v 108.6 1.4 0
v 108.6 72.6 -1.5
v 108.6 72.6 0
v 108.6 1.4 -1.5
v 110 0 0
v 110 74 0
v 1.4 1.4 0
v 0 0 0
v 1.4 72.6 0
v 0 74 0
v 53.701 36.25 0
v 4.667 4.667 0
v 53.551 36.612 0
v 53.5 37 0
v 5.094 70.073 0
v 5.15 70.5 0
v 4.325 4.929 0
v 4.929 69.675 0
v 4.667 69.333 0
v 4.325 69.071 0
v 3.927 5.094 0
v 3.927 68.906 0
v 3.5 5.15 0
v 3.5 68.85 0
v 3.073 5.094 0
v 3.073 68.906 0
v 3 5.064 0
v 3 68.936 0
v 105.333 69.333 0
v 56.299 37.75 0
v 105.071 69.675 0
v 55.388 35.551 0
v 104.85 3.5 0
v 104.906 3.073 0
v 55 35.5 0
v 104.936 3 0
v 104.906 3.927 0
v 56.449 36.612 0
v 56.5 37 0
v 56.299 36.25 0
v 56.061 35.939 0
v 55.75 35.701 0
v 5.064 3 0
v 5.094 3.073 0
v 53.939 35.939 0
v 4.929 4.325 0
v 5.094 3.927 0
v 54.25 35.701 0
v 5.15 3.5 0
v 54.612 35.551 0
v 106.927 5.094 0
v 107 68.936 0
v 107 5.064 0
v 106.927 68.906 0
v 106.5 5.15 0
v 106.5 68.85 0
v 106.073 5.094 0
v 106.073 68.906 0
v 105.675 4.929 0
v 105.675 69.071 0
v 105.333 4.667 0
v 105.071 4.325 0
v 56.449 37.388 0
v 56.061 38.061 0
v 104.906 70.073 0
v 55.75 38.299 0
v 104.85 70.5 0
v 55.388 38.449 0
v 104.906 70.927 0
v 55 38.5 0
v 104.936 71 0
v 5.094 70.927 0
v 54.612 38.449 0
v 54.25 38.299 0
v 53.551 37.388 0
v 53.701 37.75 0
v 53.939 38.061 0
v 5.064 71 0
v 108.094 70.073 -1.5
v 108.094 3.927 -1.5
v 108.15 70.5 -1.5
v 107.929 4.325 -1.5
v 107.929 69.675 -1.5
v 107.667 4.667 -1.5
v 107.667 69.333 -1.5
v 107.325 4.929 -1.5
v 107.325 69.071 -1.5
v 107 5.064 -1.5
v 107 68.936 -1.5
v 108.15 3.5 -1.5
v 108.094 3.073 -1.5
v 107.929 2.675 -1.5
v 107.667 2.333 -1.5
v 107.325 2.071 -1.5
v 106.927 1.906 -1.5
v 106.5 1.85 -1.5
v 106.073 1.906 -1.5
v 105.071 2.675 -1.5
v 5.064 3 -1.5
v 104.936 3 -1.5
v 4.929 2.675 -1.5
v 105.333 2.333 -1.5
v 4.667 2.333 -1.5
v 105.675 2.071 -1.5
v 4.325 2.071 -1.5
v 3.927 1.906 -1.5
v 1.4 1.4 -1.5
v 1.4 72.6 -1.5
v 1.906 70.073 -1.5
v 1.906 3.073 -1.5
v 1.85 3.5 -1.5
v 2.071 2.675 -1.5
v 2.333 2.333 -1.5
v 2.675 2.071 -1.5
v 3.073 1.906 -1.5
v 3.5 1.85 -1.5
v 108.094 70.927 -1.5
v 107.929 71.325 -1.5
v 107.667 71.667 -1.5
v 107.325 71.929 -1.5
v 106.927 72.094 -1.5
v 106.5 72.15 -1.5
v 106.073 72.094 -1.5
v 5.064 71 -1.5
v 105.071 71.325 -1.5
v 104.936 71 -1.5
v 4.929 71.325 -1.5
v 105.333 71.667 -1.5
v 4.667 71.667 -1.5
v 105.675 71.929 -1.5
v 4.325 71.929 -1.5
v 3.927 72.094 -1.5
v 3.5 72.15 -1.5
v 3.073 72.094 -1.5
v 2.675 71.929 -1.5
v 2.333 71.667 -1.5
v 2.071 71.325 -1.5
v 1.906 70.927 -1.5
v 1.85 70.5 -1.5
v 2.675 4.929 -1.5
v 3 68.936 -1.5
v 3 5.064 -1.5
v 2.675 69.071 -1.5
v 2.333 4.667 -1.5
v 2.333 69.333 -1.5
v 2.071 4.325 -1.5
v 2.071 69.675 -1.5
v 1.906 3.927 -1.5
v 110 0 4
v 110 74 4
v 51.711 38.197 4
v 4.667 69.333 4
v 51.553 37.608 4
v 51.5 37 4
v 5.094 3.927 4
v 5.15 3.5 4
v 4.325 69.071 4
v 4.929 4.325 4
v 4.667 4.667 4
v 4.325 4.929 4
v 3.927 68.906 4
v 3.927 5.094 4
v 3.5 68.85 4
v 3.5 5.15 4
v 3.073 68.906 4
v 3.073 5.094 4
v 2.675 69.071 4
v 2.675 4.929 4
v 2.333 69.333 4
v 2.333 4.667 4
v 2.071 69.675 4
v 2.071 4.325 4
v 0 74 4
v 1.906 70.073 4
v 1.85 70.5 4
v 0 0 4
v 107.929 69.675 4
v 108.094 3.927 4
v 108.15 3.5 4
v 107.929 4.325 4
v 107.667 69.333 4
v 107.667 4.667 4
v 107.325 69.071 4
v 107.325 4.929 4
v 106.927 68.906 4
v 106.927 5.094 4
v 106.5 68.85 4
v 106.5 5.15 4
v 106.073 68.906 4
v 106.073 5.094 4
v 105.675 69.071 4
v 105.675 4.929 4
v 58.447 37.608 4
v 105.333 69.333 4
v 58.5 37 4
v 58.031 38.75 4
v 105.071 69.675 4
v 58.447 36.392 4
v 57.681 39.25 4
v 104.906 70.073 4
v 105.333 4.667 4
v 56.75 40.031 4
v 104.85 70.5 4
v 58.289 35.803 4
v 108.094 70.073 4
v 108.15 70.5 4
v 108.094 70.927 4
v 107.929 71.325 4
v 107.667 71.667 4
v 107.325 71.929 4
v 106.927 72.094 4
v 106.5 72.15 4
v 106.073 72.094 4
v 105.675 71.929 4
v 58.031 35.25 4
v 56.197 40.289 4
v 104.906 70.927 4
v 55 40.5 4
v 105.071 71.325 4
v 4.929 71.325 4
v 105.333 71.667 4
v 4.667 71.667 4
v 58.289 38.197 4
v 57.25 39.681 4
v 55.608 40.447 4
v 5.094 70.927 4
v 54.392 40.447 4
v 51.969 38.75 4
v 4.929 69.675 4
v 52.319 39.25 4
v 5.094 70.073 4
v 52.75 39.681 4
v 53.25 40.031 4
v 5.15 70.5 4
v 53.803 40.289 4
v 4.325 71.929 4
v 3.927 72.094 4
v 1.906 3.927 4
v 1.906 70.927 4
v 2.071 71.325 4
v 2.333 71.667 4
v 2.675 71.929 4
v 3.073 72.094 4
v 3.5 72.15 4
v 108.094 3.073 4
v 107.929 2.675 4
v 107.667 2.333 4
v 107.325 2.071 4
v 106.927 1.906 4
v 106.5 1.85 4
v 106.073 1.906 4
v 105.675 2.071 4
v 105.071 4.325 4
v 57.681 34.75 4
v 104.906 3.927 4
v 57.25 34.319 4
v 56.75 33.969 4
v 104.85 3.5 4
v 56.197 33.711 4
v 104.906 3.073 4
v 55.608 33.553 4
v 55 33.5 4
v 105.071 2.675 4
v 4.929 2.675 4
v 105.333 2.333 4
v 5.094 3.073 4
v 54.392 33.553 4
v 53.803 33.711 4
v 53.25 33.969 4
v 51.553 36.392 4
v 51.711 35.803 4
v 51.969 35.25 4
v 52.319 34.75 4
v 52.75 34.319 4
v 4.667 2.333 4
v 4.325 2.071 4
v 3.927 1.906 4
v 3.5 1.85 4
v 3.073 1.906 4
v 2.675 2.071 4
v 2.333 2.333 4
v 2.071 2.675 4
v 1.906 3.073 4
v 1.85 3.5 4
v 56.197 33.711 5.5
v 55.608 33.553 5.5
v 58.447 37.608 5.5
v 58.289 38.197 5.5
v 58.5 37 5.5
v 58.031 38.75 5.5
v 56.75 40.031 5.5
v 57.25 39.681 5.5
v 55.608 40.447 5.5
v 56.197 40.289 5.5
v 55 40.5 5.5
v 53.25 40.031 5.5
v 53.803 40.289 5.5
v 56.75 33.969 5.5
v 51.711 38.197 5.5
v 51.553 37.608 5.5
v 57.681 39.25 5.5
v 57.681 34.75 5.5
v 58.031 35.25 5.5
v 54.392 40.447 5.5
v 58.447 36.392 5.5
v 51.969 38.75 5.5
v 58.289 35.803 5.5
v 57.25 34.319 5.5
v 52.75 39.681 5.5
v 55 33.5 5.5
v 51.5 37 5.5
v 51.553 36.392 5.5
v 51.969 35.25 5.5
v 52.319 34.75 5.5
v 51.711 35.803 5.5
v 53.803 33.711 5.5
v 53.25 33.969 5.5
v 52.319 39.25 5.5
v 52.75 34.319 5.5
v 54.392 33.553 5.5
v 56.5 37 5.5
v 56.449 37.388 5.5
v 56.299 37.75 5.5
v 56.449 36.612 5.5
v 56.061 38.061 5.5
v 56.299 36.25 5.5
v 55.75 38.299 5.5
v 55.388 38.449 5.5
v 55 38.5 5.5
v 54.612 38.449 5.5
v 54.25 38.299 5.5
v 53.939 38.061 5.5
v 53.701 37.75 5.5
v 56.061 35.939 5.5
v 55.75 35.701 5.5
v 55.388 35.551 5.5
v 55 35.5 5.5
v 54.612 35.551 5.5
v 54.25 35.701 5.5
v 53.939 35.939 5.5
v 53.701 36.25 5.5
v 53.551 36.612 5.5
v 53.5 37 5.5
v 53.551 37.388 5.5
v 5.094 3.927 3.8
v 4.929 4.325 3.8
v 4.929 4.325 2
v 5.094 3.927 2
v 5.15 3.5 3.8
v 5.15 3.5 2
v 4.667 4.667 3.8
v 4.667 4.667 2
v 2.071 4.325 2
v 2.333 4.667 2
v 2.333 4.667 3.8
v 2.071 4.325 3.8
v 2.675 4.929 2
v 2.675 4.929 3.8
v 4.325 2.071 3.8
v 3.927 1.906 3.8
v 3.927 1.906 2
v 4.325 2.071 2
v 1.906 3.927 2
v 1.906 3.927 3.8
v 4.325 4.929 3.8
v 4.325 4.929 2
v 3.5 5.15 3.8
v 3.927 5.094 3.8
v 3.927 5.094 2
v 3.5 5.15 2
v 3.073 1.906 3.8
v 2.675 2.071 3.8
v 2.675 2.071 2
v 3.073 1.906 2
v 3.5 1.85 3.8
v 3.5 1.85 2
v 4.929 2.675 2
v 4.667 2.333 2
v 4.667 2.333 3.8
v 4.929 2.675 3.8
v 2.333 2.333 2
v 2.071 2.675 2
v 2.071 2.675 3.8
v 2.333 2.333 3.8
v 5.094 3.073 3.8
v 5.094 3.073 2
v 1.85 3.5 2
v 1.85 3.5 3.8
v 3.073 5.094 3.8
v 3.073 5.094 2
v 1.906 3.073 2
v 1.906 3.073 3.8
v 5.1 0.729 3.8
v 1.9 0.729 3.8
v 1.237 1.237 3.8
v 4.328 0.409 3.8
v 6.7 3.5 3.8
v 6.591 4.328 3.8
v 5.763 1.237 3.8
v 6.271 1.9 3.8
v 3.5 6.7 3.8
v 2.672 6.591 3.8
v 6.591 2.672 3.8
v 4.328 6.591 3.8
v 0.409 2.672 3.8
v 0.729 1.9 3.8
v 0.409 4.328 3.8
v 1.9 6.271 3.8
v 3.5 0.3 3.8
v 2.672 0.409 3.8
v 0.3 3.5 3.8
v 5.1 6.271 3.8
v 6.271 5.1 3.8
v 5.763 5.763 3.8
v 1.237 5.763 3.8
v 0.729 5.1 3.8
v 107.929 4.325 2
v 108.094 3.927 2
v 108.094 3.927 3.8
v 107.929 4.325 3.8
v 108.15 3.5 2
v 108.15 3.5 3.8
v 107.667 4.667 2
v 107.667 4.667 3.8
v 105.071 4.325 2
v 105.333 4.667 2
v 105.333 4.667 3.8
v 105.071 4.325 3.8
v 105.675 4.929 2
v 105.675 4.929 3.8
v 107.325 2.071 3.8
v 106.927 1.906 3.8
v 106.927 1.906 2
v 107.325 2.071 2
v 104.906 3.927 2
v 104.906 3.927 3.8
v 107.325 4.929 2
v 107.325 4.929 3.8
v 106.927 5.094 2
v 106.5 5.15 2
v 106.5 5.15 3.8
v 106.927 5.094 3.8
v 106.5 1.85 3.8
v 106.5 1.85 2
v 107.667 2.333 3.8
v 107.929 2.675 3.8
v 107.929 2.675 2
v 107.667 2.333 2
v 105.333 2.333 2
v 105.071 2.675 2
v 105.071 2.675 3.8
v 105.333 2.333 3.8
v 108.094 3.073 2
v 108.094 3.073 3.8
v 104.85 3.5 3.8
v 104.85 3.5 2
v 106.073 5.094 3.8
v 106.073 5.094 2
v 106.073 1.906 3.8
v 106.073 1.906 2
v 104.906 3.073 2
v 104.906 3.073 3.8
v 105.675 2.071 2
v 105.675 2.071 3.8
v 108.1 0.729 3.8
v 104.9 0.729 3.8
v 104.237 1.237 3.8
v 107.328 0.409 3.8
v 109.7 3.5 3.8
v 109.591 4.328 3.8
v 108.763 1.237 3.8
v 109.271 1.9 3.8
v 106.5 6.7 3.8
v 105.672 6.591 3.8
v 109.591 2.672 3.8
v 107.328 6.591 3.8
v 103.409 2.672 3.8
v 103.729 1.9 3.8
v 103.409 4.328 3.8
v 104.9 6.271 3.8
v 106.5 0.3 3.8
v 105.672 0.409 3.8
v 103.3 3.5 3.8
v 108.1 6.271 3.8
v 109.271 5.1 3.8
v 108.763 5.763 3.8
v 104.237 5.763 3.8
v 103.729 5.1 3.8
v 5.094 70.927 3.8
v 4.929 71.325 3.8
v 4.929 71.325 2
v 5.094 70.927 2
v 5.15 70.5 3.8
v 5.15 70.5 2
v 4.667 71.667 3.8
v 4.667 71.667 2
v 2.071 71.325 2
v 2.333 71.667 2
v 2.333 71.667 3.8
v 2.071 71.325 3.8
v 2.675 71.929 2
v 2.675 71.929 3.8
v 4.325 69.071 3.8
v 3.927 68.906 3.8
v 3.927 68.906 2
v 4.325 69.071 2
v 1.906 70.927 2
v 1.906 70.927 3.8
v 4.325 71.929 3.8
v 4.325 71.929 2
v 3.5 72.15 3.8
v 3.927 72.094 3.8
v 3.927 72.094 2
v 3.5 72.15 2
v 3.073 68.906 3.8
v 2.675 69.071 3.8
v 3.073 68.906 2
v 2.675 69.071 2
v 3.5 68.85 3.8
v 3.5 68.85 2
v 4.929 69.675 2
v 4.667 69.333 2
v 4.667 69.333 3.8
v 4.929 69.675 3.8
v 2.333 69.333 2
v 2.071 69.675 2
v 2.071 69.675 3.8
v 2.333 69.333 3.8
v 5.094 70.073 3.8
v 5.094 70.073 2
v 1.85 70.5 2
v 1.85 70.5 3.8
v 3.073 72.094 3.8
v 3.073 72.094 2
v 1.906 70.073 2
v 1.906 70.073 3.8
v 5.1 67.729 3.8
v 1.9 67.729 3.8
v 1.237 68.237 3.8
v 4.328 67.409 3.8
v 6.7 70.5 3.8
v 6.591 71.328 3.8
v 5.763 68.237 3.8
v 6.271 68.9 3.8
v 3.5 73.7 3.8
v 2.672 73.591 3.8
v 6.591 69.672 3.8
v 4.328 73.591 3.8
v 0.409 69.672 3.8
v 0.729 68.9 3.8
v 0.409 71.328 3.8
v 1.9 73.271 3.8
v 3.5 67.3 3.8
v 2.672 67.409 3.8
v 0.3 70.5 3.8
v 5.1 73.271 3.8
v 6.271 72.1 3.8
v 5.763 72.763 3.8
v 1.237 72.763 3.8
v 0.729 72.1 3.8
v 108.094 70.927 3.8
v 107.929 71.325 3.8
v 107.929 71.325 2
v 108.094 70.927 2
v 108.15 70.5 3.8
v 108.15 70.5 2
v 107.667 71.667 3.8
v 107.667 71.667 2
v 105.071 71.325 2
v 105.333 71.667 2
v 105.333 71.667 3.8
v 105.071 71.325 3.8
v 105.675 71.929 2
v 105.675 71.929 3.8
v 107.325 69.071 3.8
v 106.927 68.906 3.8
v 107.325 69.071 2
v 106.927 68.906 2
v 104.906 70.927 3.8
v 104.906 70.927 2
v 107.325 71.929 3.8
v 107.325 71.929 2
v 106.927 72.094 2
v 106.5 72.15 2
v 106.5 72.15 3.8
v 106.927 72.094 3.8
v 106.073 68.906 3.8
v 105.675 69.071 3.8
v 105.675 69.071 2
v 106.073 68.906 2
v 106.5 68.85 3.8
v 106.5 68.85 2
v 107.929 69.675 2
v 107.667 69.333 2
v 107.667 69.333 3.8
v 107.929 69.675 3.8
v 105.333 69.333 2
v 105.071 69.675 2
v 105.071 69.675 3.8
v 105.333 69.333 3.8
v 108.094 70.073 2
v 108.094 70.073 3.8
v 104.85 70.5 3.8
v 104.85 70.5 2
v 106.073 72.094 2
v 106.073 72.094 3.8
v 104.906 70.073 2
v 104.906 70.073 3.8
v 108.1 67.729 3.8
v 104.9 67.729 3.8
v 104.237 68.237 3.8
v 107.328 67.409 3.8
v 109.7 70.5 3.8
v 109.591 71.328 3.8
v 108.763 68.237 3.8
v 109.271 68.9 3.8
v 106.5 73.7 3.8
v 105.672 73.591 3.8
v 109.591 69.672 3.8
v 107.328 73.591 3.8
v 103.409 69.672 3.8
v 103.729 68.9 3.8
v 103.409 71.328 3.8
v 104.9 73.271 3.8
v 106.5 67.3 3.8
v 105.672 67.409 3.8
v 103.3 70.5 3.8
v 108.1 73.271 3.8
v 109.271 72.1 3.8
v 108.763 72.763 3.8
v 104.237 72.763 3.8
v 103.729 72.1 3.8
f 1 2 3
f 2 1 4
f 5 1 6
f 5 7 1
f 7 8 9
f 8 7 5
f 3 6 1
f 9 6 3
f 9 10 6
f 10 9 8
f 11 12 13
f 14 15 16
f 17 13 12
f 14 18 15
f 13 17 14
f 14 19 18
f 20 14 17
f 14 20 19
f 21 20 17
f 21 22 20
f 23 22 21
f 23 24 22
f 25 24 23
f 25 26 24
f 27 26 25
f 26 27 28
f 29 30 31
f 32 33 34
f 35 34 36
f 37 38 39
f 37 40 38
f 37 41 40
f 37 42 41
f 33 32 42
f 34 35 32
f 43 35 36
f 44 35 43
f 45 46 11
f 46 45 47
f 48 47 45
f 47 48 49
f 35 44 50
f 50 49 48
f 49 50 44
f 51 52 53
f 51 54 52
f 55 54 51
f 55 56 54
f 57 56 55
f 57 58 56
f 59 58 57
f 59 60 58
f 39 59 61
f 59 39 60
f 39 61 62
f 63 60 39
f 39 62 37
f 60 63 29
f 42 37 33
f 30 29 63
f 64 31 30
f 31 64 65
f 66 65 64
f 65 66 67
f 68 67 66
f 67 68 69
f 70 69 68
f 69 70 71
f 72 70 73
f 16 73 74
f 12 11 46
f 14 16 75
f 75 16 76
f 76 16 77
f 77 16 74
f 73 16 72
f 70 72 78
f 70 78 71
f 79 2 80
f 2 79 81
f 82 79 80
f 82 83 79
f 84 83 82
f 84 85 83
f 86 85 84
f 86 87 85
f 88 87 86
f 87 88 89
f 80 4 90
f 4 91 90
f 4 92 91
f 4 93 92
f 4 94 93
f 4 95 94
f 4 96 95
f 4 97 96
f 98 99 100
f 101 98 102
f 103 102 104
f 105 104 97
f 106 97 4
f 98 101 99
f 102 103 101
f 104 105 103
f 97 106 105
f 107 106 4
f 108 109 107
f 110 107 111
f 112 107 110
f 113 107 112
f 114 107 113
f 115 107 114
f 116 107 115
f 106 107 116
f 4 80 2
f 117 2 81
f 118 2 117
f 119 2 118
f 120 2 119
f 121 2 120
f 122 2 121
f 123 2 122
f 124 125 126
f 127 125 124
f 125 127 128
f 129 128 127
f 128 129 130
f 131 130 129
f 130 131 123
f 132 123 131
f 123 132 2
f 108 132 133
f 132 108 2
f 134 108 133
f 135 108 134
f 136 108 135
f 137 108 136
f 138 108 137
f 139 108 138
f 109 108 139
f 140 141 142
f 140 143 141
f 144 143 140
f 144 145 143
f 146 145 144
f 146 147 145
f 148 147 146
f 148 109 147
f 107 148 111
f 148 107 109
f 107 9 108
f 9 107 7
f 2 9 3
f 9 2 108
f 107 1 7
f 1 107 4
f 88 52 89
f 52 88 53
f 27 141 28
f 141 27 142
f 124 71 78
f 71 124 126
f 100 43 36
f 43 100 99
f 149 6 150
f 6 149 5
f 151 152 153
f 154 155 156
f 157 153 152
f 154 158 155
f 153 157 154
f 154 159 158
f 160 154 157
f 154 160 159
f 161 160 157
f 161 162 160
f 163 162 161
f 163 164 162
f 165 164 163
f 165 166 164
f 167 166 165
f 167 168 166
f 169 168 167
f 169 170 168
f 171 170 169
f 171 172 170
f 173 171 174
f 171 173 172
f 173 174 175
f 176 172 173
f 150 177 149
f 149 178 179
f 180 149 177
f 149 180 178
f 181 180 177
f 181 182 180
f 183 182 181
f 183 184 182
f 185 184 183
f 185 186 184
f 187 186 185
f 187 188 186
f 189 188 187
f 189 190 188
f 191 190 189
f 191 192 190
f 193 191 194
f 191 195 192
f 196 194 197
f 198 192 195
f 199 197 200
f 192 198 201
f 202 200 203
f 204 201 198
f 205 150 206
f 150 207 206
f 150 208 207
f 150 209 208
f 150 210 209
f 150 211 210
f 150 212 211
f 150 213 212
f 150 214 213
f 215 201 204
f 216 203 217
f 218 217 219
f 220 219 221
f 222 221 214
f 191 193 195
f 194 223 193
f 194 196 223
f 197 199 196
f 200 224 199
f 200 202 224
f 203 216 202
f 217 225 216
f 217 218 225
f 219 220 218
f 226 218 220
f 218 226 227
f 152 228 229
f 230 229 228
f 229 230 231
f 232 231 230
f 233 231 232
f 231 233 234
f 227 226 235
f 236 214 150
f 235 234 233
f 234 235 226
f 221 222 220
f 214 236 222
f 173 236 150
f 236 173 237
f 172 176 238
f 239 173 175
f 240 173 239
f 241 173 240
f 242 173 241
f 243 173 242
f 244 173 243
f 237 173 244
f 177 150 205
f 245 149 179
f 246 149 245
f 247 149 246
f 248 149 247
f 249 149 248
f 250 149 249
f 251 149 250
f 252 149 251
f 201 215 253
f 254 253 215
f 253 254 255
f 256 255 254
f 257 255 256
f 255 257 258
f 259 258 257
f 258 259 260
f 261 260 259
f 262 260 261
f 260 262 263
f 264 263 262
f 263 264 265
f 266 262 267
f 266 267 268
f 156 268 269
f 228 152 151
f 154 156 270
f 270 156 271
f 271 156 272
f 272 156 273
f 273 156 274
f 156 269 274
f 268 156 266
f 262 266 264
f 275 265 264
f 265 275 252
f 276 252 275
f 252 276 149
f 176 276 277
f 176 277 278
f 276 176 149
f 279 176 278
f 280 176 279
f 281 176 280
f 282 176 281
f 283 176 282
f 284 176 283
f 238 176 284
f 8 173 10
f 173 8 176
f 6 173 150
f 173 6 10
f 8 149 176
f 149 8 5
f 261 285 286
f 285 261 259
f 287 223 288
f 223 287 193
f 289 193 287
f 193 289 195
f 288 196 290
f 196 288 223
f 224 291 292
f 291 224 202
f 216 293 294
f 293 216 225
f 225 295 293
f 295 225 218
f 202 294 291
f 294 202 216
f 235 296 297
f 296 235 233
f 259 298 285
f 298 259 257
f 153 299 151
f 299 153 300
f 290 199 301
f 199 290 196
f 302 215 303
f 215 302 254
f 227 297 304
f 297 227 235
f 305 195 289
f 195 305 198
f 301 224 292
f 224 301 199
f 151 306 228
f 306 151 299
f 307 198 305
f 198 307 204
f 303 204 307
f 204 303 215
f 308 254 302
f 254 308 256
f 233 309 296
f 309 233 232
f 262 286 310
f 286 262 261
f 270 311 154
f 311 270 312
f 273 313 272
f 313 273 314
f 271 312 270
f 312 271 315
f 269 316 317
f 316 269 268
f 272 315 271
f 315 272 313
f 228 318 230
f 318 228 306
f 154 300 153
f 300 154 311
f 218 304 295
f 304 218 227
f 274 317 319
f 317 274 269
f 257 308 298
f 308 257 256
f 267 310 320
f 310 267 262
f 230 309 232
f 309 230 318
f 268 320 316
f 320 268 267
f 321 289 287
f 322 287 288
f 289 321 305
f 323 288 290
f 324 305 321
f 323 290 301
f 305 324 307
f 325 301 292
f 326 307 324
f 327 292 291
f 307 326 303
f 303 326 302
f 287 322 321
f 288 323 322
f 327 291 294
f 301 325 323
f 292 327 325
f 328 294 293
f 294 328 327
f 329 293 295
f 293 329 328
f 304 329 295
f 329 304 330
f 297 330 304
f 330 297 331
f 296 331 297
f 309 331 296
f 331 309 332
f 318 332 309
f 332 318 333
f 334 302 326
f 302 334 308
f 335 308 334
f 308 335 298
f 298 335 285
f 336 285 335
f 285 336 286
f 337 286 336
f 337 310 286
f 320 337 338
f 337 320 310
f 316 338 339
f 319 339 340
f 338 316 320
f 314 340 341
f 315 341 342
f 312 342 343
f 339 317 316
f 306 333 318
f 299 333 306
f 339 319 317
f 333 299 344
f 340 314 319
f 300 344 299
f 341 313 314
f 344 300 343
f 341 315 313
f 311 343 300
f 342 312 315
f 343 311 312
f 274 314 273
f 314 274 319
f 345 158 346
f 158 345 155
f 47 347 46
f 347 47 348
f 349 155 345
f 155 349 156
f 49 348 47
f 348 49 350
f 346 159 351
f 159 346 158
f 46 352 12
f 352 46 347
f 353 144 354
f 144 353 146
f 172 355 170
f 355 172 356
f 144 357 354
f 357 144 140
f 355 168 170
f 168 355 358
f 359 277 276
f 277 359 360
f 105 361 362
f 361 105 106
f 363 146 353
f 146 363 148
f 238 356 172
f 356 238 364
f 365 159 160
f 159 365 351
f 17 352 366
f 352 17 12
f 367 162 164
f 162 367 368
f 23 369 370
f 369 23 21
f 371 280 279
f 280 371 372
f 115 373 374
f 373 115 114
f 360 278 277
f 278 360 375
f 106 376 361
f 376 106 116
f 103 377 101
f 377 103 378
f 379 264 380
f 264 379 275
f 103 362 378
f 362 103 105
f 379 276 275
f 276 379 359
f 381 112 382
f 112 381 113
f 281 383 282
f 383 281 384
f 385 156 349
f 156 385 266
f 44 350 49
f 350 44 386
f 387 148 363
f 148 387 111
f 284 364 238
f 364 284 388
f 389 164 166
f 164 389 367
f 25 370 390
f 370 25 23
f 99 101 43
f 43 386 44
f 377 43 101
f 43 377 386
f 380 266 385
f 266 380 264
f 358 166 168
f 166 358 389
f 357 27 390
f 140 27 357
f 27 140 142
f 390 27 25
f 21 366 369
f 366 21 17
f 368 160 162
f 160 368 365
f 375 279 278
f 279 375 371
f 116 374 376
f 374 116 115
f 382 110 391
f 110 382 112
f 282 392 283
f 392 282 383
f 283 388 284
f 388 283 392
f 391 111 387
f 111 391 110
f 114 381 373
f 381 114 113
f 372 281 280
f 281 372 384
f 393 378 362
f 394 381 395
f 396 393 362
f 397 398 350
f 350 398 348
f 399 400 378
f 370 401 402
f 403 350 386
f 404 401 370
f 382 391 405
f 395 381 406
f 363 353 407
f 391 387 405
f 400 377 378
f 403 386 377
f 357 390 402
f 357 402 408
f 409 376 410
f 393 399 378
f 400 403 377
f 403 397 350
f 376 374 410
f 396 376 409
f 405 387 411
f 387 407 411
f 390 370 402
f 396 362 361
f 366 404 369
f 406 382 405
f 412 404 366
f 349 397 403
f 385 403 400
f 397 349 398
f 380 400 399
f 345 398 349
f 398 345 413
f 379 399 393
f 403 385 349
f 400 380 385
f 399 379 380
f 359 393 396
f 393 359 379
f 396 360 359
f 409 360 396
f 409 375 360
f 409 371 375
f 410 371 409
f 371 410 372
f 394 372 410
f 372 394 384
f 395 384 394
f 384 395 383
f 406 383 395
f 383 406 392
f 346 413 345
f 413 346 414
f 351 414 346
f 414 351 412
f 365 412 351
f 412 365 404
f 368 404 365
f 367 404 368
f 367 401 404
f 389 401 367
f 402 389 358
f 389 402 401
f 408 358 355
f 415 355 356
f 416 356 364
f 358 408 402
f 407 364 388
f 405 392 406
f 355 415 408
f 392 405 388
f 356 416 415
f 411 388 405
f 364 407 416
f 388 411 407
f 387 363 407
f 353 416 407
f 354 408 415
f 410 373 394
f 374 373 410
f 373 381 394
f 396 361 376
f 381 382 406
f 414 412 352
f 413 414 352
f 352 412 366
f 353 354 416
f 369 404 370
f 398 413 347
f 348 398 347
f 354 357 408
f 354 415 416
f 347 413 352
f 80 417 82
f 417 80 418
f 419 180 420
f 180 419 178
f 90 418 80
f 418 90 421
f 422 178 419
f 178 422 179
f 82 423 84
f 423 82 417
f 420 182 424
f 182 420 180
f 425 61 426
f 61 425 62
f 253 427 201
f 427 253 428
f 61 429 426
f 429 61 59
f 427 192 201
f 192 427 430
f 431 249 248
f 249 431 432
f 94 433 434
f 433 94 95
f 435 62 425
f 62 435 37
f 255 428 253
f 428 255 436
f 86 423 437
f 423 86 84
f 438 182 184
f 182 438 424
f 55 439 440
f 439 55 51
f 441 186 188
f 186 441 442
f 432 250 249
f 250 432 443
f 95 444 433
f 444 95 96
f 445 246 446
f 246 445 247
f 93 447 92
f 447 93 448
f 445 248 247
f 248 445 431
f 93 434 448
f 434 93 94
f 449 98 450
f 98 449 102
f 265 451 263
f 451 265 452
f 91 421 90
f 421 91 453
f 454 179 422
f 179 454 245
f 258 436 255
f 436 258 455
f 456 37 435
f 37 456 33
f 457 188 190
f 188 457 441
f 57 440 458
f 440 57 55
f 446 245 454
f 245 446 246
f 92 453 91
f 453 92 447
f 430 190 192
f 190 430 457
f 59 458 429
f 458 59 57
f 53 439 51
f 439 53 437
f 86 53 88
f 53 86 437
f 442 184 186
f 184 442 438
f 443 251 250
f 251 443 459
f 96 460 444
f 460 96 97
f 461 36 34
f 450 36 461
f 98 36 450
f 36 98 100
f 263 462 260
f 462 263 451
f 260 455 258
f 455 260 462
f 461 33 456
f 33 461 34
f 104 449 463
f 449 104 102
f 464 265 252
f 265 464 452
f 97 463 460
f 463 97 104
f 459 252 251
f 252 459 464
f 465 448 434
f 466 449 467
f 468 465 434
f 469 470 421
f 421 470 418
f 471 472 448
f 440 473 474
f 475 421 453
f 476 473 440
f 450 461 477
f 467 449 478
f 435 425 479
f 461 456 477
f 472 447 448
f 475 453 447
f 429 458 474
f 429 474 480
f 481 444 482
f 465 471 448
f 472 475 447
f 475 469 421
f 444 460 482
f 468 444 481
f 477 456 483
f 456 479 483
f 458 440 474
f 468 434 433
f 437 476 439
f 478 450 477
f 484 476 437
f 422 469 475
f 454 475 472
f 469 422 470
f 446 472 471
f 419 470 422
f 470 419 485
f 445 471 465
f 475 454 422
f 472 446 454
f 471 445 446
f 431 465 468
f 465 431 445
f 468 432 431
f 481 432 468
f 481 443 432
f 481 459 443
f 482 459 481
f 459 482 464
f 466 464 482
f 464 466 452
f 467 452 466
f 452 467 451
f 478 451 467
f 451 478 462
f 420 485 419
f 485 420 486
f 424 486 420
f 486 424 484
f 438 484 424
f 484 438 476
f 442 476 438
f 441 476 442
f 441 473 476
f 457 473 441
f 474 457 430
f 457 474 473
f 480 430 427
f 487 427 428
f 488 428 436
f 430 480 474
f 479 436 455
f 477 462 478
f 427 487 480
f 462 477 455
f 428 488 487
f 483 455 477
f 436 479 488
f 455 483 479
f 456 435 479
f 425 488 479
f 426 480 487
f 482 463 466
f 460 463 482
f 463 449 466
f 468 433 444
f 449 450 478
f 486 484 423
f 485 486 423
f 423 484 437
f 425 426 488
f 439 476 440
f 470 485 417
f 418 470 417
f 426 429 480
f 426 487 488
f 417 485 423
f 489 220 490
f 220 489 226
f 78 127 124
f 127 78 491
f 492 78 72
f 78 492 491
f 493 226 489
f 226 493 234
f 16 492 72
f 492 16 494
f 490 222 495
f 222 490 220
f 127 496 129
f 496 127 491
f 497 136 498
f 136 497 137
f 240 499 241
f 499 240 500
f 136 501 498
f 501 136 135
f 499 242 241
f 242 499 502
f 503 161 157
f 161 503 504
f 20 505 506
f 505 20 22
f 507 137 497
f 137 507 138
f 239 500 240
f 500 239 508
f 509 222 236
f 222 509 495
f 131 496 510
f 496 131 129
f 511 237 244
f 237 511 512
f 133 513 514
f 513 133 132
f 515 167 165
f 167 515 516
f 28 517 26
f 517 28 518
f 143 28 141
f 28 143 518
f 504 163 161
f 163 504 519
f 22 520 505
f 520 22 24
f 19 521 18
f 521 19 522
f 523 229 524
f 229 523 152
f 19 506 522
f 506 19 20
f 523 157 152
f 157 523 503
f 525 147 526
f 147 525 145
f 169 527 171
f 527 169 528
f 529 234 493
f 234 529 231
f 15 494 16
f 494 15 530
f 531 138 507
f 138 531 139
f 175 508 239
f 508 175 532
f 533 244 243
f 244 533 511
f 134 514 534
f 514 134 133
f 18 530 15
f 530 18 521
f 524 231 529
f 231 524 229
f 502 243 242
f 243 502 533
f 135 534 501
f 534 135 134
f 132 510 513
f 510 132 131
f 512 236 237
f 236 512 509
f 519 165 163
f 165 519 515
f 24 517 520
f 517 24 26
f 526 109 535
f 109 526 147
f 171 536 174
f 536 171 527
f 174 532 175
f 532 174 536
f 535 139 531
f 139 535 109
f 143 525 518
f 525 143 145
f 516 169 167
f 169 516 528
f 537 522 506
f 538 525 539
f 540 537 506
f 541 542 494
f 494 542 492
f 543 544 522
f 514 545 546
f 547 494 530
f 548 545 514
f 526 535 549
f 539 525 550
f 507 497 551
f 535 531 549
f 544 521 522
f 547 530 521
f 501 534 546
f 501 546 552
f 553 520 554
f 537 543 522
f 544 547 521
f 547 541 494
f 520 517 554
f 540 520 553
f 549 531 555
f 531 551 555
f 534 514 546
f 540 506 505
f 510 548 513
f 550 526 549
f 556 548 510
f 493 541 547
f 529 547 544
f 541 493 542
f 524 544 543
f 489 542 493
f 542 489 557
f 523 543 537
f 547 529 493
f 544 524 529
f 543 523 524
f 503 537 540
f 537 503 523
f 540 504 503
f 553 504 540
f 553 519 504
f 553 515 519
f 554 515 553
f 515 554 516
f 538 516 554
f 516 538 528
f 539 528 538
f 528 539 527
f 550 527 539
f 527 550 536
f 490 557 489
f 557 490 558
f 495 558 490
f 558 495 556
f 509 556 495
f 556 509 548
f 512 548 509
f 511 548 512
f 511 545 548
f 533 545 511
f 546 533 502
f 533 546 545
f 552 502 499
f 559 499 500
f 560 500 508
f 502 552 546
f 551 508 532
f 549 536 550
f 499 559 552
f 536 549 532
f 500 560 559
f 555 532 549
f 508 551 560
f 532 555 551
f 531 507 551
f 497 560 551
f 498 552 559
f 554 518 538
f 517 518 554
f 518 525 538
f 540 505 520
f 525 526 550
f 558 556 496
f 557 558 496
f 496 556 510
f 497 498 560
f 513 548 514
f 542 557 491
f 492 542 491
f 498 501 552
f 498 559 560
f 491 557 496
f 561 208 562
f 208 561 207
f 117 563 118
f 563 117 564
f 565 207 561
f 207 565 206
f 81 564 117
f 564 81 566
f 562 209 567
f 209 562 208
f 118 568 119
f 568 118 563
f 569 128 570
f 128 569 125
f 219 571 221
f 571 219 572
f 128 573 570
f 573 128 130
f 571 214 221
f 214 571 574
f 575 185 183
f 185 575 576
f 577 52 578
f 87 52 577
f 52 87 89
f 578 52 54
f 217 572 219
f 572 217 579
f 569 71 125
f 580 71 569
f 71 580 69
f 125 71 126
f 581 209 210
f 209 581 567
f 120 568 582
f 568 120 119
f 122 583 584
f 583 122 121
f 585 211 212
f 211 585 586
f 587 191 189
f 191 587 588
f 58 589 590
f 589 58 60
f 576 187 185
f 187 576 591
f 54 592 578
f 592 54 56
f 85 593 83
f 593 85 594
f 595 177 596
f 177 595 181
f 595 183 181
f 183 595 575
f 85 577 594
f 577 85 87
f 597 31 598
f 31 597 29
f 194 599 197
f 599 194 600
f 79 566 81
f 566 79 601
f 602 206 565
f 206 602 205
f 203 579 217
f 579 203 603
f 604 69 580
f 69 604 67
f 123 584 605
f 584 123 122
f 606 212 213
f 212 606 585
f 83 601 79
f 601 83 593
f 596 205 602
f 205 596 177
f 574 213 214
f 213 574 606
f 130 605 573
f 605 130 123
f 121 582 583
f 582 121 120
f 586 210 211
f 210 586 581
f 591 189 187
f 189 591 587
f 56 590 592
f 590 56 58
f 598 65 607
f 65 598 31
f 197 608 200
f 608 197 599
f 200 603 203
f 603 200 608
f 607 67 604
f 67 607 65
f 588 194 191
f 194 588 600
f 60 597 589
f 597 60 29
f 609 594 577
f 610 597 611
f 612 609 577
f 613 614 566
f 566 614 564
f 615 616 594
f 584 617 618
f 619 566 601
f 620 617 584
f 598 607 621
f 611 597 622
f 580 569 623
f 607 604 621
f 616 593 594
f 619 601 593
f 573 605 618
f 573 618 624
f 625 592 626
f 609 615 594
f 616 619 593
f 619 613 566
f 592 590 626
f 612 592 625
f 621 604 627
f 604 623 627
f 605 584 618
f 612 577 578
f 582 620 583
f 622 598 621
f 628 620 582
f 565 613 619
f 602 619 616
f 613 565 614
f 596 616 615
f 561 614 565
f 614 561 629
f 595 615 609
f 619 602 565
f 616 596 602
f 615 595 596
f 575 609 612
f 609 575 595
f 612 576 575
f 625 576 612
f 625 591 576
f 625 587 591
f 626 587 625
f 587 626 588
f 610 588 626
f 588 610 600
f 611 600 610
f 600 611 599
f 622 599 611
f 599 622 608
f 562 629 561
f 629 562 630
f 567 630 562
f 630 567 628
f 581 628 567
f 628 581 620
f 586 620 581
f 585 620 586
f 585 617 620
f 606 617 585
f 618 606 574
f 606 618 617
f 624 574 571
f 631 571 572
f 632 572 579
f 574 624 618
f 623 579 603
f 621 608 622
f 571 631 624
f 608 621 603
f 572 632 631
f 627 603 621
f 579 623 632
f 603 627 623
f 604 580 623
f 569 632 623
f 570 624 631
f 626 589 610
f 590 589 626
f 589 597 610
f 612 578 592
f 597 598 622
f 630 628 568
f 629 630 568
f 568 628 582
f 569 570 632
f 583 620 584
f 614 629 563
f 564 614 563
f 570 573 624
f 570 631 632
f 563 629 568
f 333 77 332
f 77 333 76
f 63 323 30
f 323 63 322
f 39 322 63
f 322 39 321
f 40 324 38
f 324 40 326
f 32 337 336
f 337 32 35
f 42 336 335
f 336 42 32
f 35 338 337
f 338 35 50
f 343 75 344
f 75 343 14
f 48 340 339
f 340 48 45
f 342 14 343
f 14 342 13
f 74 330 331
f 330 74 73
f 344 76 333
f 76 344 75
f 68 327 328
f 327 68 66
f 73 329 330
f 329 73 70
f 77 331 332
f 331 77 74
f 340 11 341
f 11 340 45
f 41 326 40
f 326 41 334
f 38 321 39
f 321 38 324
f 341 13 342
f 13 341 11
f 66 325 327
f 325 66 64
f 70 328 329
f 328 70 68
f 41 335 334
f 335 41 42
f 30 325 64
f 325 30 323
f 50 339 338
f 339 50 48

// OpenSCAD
// file: ../../00_common/parameters.scad
// =============================================================================
// OpenMotorBridge - Global CAD Parameters & Settings
// =============================================================================
// File: hardware/cad/scad/00_common/parameters.scad
// Description: Global dimensional constants, manufacturing clearances and
//              circle resolution ($fn) for all OpenSCAD modules.
// =============================================================================

// --- 1. Circle & Curve Resolution ---
$fn = 60; // Smooth cylinders and holes for high-quality MJF 3D printing

// --- 2. Central Main Box Dimensions (3-Tier Sandwich) ---
MAIN_BOX_OUTER_L      = 110.0; // Outer length in X (mm)
MAIN_BOX_OUTER_W      = 74.0;  // Outer width in Y (mm)
MAIN_BOX_LOWER_H      = 17.0;  // Lower case height in Z (mm)
MAIN_BOX_MID_H        = 15.0;  // Mid tray height in Z (mm)
MAIN_BOX_LID_H        = 4.0;   // Lid plate thickness in Z (mm)
MAIN_BOX_WALL         = 2.5;   // Nominal wall thickness (mm)
MAIN_BOX_CORNER_POST  = 7.0;   // Corner clamping screw post size (mm, for M3 hex nut pockets)

// --- 3. Satellite Pod Dimensions (Universal Enlarged Envelope) ---
POD_OUTER_L           = 150.0; // Outer length in X (mm, standardized for serial PCBA 03 + Cardo/Sena/OMM)
POD_OUTER_W           = 70.0;  // Outer width in Y (mm)
POD_OUTER_H           = 38.0;  // Outer height in Z (mm)
POD_WALL              = 3.5;   // Nominal wall thickness (mm)
POD_BULKHEAD_X        = 18.0;  // Partition bulkhead position in X (mm)
POD_CHAMBER_L         = 132.0; // Sliding chamber length in X (mm, clears 130mm sled + 2mm margin)
POD_CHAMBER_W         = 63.0;  // Sliding chamber width in Y (mm)
POD_CHAMBER_H         = 31.0;  // Sliding chamber height in Z (mm)

// --- 4. Pod Linear Guide Rails (Poka-Yoke Tongue & Groove) ---
POD_GROOVE_W          = 3.0;   // Internal guide groove width in Z (mm)
POD_GROOVE_DEPTH      = 1.5;   // Internal guide groove depth in Y (mm)
POD_GROOVE_LEFT_Z     = 10.0;  // Center height of left groove (mm)
POD_GROOVE_RIGHT_Z    = 18.0;  // Center height of right groove (mm, asym offset)

CARTRIDGE_TONGUE_W    = 2.6;   // Cartridge tongue rail height in Z (mm, 0.2mm clearance)
CARTRIDGE_TONGUE_PROT = 1.4;   // Cartridge tongue protrusion in Y (mm, 0.1mm clearance)
CARTRIDGE_CHAMFER_L   = 4.0;   // 30° lead-in chamfer nose length (mm)

// --- 5. Cartridge Dimensions (Enlarged Universal Sled) ---
CARTRIDGE_BASE_L      = 130.0; // Sled length in X (mm, accommodates PCBA 03 + OEM Cardo Air-Mount/Sena/OMM serial layout)
CARTRIDGE_BASE_W      = 58.0;  // Sled width in Y (mm)
CARTRIDGE_BASE_H      = 28.0;  // Sled height in Z (mm)
CARTRIDGE_FACE_L      = 4.0;   // Front faceplate thickness in X (mm)
CARTRIDGE_FACE_W      = 64.0;  // Front faceplate width in Y (mm)
CARTRIDGE_FACE_H      = 34.0;  // Front faceplate height in Z (mm)

// --- 5a. RF Interface & Sealing Dimensions ---
SMA_BORE_R            = 3.25;  // Ø 6.5 mm through-hole for standard SMA bulkhead
SMA_ORECESS_R         = 4.75;  // Ø 9.5 mm recess for waterproof silicone O-ring
SMA_ORECESS_DEPTH     = 1.2;   // 1.2 mm deep O-ring compression pocket

// --- 5b. Magnetic Anti-Theft Lock System ---
LATCH_PIVOT_X         = 65.0;  // Center pivot position along sled X (mm, centered on 130mm sled)
LATCH_MAGNET_X        = 53.0;  // Ferromagnetic anchor position along sled X (mm)
LATCH_TOOTH_X         = 77.0;  // Locking sawtooth pawl position along sled X (mm)
LATCH_ARM_H           = 6.0;   // Rocker lever height in Z (mm)
LATCH_ARM_THICK       = 2.6;   // Rocker beam thickness in Y (mm)
LATCH_MAGNET_PIN_DIA  = 6.2;   // Bore for Ø 6.0 mm steel dowel pin (mm)
LATCH_SPRING_DIA      = 3.8;   // Bore for Ø 3.5 mm return compression spring (mm)

// --- 6. Standard Captive Hex Nut Pockets (DIN 934 / DIN 985 with +0.2 mm MJF/FDM clearance) ---
NUT_M2_SW             = 4.2;   // M2 across flats (nominal 4.0 mm)
NUT_M2_H              = 1.8;   // M2 thickness (nominal 1.6 mm)
NUT_M2_5_SW           = 5.2;   // M2.5 across flats (nominal 5.0 mm)
NUT_M2_5_H            = 2.2;   // M2.5 thickness (nominal 2.0 mm)
NUT_M3_SW             = 5.7;   // M3 across flats (nominal 5.5 mm)
NUT_M3_H              = 2.6;   // M3 thickness (nominal 2.4 mm)
NUT_M4_SW             = 7.2;   // M4 across flats (nominal 7.0 mm)
NUT_M4_H              = 3.4;   // M4 thickness (nominal 3.2 mm)
NUT_M5_SW             = 8.2;   // M5 across flats (nominal 8.0 mm)
NUT_M5_H              = 4.2;   // M5 thickness (nominal 4.0 mm)

// Direct Plastic Thread-Forming / Self-Tapping Pilot Holes in PA12 (100% Soldering-Iron Free)
M2_PILOT_HOLE_R       = 0.85;  // Core hole for M2 screws in PA12 (Ø 1.7 mm)
M2_5_PILOT_HOLE_R     = 1.05;  // Core hole for M2.5 screws in PA12 (Ø 2.1 mm)
M3_PILOT_HOLE_R       = 1.25;  // Core hole for M3 screws in PA12 (Ø 2.5 mm)

// --- 7. Screw & Clearance Dimensions ---
M2_SCREW_HOLE_R       = 1.1;   // M2 clearance hole (r = 1.1 mm -> Ø 2.2 mm)
M2_5_SCREW_HOLE_R     = 1.4;   // M2.5 clearance hole (r = 1.4 mm -> Ø 2.8 mm)
M3_SCREW_HOLE_R       = 1.65;  // M3 clearance hole (r = 1.65 mm -> Ø 3.3 mm)
M4_SCREW_HOLE_R       = 2.2;   // M4 clearance hole (r = 2.2 mm -> Ø 4.4 mm)
M8_BORE_R             = 4.0;   // M8 cable through-bore (r = 4.0 mm -> Ø 8.0 mm)
M8_STUDS_OUTER_R      = 6.0;   // M8 neck outer radius (Ø 12.0 mm)

// --- 8. Universal Front Node Enclosure Dimensions (Type E: 98 x 68 x 25 mm) ---
FRONT_NODE_PCB_L      = 82.0;  // PCB length in X (mm, PCBA 05)
FRONT_NODE_PCB_W      = 50.0;  // PCB width in Y (mm, PCBA 05)
FRONT_NODE_PCB_H      = 1.6;   // PCB thickness in Z (mm)
FRONT_NODE_PCB_R      = 2.5;   // PCB corner radius (mm)

FRONT_NODE_CHAMBER_L  = 86.0;  // Internal chamber length in X (mm, 2mm margin per side)
FRONT_NODE_CHAMBER_W  = 56.0;  // Internal chamber width in Y (mm, 3mm margin per side)
FRONT_NODE_TUB_H      = 17.5;  // Lower tub depth in Z (mm)
FRONT_NODE_LID_H      = 7.5;   // Upper lid height in Z (mm)
FRONT_NODE_WALL       = 2.5;   // Wall thickness in HP MJF PA12 (mm)
FRONT_NODE_CORNER_R   = 4.0;   // Outer enclosure corner radius (mm)

FRONT_NODE_OUTER_L    = FRONT_NODE_CHAMBER_L + 2 * FRONT_NODE_WALL + 7.0; // 98.0 mm
FRONT_NODE_OUTER_W    = FRONT_NODE_CHAMBER_W + 2 * FRONT_NODE_WALL + 7.0; // 68.0 mm
FRONT_NODE_OUTER_H    = FRONT_NODE_TUB_H + FRONT_NODE_LID_H;              // 25.0 mm

// PCB Standoff Heights & Radii (100% Soldering-Iron Free)
FRONT_NODE_STANDOFF_H = 3.0;   // Height of PCB standoffs from floor (mm)
FRONT_NODE_STANDOFF_R = 3.0;   // Outer radius of M2.5 screw bosses (mm)
FRONT_NODE_CORE_HOLE_R= M2_5_PILOT_HOLE_R; // Core hole for direct M2.5 screw engagement (Ø 2.1 mm)

// AMPS 4-Hole Mounting Pattern (38 x 30 mm with DIN 934 M4 Captive Nut Pockets)
AMPS_SPACING_X        = 38.0;  // AMPS hole distance in X (mm)
AMPS_SPACING_Y        = 30.0;  // AMPS hole distance in Y (mm)
AMPS_NUT_SW           = NUT_M4_SW; // Captive M4 hex nut pocket across flats (7.2 mm)
AMPS_NUT_H            = NUT_M4_H;  // Captive M4 hex nut pocket depth (3.4 mm)

// Acoustic Vent for Knowles SPH0645 MEMS
FRONT_NODE_MIC_HOLE_R = 1.25;  // Sound canal radius (Ø 2.5 mm)
FRONT_NODE_MIC_MEMB_R = 3.0;   // Gore ePTFE membrane pocket radius (Ø 6.0 mm)
FRONT_NODE_MIC_MEMB_D = 0.8;   // Membrane pocket depth (mm)
// main file
// =============================================================================
// OpenMotorBridge - Main Box: Lid Plate & Gore Vent Boss (Gehäusedeckel)
// =============================================================================
// File: hardware/cad/scad/01_main_box/parts/020_lid_plate.scad
// Description: Ready-to-print enclosure top lid with continuous perimeter tongue
//              lip (Feder), integrated Gore ePTFE breather vent boss, internal
//              Taoglas FXP895 LoRa 868 MHz flex antenna pocket, and 4x M3 screw holes.
// =============================================================================

include <../../00_common/parameters.scad>;

module main_box_lid_plate(length=110.0, width=74.0, plate_h=4.0, lip_h=1.5, lip_w=1.6) {
    difference() {
        union() {
            // 1. Solid Top Lid Plate
            cube(size=[length, width, plate_h], center=false);

            // 2. Continuous Perimeter Tongue Lip (Feder for sealing groove)
            translate([0, 0, -lip_h]) {
                difference() {
                    translate([1.4, 1.4, 0])
                        cube(size=[length - 2.8, width - 2.8, lip_h], center=false);
                    translate([1.4 + lip_w, 1.4 + lip_w, -0.1])
                        cube(size=[length - 2.8 - 2*lip_w, width - 2.8 - 2*lip_w, lip_h + 0.2], center=false);
                }
            }

            // 3. Gore ePTFE Pressure Equalization Vent Boss (Top Center: Ø 7.0 mm x 1.5 mm)
            translate([length/2.0, width/2.0, plate_h])
                cylinder(r=3.5, h=1.5, center=false, $fn=36);
        }

        // 4. Gore Vent Center Breather Hole (Ø 3.0 mm through-hole)
        translate([length/2.0, width/2.0, -lip_h - 0.5])
            cylinder(r=1.5, h=plate_h + lip_h + 2.5, center=false, $fn=24);

        // 5. 100% Solid Underside (Cable-Free Lid): Antennas are housed on the modular
        // battery bridge (013_battery_antenna_bridge.scad), making the lid 100% passive,
        // completely free of tethered cables, and exceptionally stiff and leak-proof.

        // 6. 4x M3 Corner Countersunk Screw Holes
        corner_offset = MAIN_BOX_CORNER_POST / 2.0;
        for (pos = [
            [corner_offset, corner_offset],
            [length - corner_offset, corner_offset],
            [corner_offset, width - corner_offset],
            [length - corner_offset, width - corner_offset]
        ]) {
            translate([pos[0], pos[1], -lip_h - 0.5]) {
                cylinder(r=M3_SCREW_HOLE_R, h=plate_h + lip_h + 1.0, center=false, $fn=24);
                // 90° Countersink recess on top face
                translate([0, 0, plate_h + lip_h - 1.5])
                    cylinder(r1=M3_SCREW_HOLE_R, r2=3.2, h=1.8, center=false, $fn=24);
            }
        }
    }
}

// Standalone preview
main_box_lid_plate();
